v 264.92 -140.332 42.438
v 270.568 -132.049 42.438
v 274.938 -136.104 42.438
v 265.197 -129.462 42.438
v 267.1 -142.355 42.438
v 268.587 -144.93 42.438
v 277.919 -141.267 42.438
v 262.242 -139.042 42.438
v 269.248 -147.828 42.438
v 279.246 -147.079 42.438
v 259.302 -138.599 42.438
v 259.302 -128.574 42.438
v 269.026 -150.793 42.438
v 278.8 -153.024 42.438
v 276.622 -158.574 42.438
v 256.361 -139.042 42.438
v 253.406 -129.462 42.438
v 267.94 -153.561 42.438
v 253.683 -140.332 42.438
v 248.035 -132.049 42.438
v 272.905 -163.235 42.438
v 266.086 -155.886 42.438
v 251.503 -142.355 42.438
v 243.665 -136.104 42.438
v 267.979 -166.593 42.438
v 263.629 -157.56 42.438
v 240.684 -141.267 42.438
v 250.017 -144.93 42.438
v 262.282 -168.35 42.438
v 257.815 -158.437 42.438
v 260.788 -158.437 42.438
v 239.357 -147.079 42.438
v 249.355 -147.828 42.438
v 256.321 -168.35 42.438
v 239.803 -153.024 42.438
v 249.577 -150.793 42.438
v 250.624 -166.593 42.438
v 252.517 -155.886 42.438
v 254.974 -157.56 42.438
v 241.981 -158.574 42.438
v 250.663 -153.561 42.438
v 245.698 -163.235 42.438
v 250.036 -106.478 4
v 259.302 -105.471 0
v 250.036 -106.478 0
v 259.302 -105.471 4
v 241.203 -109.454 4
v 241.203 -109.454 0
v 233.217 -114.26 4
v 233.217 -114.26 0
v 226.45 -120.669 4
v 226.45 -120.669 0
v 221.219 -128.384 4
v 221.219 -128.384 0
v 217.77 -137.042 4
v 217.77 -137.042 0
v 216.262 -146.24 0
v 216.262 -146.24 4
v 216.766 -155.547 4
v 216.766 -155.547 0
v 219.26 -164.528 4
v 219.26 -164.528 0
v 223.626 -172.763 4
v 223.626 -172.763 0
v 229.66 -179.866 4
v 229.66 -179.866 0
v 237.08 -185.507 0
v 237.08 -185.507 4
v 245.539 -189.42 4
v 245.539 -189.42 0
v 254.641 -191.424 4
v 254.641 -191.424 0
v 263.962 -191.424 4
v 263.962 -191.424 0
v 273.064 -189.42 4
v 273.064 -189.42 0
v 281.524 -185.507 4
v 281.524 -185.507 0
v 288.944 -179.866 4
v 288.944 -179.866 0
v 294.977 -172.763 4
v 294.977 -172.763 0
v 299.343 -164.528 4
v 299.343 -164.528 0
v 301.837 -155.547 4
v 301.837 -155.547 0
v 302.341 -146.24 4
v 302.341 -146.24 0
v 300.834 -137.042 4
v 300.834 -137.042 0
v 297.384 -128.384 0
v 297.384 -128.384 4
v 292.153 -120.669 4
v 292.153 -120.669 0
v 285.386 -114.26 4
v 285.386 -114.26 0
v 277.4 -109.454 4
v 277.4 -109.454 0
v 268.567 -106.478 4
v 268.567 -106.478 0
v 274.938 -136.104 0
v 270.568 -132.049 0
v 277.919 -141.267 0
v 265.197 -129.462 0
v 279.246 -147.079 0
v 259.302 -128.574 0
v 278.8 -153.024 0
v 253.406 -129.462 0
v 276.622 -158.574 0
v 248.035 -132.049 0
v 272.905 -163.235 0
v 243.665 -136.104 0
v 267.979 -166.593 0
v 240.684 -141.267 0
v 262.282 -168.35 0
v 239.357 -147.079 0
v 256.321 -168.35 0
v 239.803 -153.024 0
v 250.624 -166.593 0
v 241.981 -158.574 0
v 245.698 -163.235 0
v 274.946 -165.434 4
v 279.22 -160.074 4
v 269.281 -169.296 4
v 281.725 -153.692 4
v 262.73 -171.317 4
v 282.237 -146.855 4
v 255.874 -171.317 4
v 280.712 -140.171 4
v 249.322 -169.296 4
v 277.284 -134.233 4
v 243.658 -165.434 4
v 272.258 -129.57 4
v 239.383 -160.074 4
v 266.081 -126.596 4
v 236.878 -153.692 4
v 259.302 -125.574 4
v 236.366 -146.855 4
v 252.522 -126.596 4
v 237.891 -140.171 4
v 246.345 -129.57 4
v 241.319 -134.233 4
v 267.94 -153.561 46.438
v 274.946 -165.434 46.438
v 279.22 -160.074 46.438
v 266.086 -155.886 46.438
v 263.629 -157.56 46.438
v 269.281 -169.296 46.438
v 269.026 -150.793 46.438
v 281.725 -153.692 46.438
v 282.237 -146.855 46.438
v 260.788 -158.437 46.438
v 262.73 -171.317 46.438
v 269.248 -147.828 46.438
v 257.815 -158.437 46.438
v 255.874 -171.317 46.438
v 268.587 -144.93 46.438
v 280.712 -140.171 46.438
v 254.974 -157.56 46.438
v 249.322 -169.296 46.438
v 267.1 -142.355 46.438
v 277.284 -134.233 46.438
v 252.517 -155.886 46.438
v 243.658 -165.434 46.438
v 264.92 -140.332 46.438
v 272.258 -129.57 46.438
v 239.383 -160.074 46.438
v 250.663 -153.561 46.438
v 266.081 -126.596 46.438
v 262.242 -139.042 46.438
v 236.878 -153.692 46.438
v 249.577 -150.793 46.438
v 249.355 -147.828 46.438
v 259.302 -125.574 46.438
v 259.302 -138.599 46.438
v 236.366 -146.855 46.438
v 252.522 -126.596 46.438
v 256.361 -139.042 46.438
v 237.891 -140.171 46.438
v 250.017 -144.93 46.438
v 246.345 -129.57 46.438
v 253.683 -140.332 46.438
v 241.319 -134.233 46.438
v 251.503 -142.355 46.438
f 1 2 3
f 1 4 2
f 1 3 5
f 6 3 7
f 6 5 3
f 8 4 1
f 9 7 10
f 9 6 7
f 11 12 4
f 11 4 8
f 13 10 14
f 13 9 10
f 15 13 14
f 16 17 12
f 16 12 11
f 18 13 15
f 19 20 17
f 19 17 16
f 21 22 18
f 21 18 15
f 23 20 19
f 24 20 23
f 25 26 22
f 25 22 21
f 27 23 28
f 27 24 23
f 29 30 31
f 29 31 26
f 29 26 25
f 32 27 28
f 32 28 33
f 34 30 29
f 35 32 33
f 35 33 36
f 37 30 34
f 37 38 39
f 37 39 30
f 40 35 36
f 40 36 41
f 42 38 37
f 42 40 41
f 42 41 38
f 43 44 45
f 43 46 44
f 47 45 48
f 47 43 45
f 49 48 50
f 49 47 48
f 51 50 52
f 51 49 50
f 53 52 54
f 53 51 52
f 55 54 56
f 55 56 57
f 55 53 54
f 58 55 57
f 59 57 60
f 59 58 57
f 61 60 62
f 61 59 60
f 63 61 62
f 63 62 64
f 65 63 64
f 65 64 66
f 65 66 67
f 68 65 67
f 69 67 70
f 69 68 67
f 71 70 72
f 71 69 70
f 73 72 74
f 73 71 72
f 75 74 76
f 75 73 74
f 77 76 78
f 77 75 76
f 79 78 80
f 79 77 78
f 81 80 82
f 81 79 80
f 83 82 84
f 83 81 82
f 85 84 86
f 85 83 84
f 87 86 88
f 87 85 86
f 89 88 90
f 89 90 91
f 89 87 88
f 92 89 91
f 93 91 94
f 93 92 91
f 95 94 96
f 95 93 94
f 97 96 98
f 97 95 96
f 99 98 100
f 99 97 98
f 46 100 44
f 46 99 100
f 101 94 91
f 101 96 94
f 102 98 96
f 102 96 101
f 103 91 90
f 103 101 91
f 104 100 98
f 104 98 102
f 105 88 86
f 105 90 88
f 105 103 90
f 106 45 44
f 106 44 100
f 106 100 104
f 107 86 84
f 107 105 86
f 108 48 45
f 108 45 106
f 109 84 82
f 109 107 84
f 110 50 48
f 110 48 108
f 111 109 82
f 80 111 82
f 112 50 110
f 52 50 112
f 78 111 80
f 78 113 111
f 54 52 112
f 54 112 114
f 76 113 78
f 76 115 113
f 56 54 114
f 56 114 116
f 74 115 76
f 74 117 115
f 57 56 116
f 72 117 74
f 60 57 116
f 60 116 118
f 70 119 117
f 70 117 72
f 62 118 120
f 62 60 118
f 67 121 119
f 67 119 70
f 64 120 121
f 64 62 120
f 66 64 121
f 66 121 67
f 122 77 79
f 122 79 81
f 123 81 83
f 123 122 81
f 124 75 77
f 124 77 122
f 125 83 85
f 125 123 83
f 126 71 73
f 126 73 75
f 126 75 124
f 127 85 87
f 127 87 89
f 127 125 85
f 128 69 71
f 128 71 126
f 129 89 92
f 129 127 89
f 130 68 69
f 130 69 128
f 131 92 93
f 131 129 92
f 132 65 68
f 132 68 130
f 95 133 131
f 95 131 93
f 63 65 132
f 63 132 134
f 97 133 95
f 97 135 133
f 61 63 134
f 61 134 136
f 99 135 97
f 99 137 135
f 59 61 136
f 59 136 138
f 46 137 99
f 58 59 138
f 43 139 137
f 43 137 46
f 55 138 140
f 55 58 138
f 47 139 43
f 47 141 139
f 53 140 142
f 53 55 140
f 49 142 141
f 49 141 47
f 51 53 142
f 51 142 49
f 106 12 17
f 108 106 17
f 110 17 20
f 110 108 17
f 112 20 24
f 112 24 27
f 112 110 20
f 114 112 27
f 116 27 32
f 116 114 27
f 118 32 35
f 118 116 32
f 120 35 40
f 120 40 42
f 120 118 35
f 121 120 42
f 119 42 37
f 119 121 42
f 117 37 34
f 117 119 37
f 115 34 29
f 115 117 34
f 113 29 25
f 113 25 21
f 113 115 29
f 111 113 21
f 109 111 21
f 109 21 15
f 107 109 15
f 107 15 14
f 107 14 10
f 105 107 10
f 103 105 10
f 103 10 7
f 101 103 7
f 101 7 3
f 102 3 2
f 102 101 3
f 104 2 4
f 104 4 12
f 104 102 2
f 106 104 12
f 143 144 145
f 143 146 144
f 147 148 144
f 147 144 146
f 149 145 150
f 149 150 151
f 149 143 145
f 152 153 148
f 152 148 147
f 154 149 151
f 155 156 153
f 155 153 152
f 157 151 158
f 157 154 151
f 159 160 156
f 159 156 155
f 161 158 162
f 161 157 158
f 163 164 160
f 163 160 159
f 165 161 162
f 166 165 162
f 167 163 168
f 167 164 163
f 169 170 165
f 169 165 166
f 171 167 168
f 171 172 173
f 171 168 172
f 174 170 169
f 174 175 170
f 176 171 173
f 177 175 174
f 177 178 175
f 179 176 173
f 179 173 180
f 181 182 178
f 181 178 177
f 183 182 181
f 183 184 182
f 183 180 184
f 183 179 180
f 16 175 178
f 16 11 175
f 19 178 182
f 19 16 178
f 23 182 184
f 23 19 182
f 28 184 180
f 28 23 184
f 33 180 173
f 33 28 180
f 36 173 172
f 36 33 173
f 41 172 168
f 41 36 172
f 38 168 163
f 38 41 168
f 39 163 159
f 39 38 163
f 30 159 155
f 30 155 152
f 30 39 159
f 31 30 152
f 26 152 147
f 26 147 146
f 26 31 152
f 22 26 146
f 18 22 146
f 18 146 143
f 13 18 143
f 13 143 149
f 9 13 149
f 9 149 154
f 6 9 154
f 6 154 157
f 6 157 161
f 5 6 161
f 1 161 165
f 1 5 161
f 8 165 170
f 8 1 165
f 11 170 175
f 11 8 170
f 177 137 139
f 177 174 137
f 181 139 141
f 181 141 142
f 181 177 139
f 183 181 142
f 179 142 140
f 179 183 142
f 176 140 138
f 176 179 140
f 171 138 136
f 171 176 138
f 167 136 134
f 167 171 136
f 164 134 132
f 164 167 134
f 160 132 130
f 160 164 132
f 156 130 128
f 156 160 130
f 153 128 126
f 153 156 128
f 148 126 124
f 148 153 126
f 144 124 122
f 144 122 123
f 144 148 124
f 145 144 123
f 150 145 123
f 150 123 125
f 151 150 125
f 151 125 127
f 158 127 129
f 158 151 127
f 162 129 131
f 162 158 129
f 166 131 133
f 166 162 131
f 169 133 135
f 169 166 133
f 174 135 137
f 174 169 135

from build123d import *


with BuildPart() as part:
    # Sketch2 → Revolve1 (revolve)
    with BuildSketch(Plane.ZY.offset(-259.301545348)):
        Polygon((4, -105.47061945), (4, -125.573704322), (46.438180449, -125.573704322), (46.438180449, -138.59916661), (42.438180449, -138.59916661), (42.438180449, -128.573704322), (0, -128.573704322), (0, -105.47061945), align=None)
    revolve(axis=Axis((259.301545348, -148.573704322, -5), (0, 0, 1)))


solid = part.part
